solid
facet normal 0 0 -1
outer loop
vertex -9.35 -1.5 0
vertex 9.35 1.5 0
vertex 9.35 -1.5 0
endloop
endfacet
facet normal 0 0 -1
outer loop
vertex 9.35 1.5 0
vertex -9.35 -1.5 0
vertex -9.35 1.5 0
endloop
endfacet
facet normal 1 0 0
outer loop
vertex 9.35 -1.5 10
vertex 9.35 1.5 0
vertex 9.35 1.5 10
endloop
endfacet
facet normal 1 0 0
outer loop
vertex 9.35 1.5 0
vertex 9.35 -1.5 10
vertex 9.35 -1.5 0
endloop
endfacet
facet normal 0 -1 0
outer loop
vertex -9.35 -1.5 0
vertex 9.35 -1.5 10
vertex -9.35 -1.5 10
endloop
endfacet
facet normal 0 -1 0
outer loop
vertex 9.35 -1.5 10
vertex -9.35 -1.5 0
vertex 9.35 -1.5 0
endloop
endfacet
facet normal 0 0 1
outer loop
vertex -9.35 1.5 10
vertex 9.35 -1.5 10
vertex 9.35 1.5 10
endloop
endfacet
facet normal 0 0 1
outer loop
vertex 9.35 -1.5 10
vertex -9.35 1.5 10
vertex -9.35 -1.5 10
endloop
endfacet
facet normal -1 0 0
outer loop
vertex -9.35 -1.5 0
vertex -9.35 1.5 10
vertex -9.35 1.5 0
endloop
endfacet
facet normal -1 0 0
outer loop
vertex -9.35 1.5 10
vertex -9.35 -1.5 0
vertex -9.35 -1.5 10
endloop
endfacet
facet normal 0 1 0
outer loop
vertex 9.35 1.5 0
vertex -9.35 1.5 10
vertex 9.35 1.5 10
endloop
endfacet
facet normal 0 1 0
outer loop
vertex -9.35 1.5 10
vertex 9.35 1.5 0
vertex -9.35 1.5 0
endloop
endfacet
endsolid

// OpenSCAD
// Built by bench/smallmodels/features/compiler.py from a list of features.
$fn = 64;
difference() {
  union() {
    translate([0, 0, 0]) linear_extrude(height = 10) polygon([[-9.35, -1.5], [9.35, -1.5], [9.35, 1.5], [-9.35, 1.5]]);
  }
  union() {
    translate([-20, 0, 0]) rotate([0, 0, 0]) translate([-5, -5, 0]) cube([10, 10, 10]);
    translate([30, 0, 0]) rotate([0, 0, 0]) translate([-5, -2.5, 0]) cube([10, 5, 10]);
  }
}
